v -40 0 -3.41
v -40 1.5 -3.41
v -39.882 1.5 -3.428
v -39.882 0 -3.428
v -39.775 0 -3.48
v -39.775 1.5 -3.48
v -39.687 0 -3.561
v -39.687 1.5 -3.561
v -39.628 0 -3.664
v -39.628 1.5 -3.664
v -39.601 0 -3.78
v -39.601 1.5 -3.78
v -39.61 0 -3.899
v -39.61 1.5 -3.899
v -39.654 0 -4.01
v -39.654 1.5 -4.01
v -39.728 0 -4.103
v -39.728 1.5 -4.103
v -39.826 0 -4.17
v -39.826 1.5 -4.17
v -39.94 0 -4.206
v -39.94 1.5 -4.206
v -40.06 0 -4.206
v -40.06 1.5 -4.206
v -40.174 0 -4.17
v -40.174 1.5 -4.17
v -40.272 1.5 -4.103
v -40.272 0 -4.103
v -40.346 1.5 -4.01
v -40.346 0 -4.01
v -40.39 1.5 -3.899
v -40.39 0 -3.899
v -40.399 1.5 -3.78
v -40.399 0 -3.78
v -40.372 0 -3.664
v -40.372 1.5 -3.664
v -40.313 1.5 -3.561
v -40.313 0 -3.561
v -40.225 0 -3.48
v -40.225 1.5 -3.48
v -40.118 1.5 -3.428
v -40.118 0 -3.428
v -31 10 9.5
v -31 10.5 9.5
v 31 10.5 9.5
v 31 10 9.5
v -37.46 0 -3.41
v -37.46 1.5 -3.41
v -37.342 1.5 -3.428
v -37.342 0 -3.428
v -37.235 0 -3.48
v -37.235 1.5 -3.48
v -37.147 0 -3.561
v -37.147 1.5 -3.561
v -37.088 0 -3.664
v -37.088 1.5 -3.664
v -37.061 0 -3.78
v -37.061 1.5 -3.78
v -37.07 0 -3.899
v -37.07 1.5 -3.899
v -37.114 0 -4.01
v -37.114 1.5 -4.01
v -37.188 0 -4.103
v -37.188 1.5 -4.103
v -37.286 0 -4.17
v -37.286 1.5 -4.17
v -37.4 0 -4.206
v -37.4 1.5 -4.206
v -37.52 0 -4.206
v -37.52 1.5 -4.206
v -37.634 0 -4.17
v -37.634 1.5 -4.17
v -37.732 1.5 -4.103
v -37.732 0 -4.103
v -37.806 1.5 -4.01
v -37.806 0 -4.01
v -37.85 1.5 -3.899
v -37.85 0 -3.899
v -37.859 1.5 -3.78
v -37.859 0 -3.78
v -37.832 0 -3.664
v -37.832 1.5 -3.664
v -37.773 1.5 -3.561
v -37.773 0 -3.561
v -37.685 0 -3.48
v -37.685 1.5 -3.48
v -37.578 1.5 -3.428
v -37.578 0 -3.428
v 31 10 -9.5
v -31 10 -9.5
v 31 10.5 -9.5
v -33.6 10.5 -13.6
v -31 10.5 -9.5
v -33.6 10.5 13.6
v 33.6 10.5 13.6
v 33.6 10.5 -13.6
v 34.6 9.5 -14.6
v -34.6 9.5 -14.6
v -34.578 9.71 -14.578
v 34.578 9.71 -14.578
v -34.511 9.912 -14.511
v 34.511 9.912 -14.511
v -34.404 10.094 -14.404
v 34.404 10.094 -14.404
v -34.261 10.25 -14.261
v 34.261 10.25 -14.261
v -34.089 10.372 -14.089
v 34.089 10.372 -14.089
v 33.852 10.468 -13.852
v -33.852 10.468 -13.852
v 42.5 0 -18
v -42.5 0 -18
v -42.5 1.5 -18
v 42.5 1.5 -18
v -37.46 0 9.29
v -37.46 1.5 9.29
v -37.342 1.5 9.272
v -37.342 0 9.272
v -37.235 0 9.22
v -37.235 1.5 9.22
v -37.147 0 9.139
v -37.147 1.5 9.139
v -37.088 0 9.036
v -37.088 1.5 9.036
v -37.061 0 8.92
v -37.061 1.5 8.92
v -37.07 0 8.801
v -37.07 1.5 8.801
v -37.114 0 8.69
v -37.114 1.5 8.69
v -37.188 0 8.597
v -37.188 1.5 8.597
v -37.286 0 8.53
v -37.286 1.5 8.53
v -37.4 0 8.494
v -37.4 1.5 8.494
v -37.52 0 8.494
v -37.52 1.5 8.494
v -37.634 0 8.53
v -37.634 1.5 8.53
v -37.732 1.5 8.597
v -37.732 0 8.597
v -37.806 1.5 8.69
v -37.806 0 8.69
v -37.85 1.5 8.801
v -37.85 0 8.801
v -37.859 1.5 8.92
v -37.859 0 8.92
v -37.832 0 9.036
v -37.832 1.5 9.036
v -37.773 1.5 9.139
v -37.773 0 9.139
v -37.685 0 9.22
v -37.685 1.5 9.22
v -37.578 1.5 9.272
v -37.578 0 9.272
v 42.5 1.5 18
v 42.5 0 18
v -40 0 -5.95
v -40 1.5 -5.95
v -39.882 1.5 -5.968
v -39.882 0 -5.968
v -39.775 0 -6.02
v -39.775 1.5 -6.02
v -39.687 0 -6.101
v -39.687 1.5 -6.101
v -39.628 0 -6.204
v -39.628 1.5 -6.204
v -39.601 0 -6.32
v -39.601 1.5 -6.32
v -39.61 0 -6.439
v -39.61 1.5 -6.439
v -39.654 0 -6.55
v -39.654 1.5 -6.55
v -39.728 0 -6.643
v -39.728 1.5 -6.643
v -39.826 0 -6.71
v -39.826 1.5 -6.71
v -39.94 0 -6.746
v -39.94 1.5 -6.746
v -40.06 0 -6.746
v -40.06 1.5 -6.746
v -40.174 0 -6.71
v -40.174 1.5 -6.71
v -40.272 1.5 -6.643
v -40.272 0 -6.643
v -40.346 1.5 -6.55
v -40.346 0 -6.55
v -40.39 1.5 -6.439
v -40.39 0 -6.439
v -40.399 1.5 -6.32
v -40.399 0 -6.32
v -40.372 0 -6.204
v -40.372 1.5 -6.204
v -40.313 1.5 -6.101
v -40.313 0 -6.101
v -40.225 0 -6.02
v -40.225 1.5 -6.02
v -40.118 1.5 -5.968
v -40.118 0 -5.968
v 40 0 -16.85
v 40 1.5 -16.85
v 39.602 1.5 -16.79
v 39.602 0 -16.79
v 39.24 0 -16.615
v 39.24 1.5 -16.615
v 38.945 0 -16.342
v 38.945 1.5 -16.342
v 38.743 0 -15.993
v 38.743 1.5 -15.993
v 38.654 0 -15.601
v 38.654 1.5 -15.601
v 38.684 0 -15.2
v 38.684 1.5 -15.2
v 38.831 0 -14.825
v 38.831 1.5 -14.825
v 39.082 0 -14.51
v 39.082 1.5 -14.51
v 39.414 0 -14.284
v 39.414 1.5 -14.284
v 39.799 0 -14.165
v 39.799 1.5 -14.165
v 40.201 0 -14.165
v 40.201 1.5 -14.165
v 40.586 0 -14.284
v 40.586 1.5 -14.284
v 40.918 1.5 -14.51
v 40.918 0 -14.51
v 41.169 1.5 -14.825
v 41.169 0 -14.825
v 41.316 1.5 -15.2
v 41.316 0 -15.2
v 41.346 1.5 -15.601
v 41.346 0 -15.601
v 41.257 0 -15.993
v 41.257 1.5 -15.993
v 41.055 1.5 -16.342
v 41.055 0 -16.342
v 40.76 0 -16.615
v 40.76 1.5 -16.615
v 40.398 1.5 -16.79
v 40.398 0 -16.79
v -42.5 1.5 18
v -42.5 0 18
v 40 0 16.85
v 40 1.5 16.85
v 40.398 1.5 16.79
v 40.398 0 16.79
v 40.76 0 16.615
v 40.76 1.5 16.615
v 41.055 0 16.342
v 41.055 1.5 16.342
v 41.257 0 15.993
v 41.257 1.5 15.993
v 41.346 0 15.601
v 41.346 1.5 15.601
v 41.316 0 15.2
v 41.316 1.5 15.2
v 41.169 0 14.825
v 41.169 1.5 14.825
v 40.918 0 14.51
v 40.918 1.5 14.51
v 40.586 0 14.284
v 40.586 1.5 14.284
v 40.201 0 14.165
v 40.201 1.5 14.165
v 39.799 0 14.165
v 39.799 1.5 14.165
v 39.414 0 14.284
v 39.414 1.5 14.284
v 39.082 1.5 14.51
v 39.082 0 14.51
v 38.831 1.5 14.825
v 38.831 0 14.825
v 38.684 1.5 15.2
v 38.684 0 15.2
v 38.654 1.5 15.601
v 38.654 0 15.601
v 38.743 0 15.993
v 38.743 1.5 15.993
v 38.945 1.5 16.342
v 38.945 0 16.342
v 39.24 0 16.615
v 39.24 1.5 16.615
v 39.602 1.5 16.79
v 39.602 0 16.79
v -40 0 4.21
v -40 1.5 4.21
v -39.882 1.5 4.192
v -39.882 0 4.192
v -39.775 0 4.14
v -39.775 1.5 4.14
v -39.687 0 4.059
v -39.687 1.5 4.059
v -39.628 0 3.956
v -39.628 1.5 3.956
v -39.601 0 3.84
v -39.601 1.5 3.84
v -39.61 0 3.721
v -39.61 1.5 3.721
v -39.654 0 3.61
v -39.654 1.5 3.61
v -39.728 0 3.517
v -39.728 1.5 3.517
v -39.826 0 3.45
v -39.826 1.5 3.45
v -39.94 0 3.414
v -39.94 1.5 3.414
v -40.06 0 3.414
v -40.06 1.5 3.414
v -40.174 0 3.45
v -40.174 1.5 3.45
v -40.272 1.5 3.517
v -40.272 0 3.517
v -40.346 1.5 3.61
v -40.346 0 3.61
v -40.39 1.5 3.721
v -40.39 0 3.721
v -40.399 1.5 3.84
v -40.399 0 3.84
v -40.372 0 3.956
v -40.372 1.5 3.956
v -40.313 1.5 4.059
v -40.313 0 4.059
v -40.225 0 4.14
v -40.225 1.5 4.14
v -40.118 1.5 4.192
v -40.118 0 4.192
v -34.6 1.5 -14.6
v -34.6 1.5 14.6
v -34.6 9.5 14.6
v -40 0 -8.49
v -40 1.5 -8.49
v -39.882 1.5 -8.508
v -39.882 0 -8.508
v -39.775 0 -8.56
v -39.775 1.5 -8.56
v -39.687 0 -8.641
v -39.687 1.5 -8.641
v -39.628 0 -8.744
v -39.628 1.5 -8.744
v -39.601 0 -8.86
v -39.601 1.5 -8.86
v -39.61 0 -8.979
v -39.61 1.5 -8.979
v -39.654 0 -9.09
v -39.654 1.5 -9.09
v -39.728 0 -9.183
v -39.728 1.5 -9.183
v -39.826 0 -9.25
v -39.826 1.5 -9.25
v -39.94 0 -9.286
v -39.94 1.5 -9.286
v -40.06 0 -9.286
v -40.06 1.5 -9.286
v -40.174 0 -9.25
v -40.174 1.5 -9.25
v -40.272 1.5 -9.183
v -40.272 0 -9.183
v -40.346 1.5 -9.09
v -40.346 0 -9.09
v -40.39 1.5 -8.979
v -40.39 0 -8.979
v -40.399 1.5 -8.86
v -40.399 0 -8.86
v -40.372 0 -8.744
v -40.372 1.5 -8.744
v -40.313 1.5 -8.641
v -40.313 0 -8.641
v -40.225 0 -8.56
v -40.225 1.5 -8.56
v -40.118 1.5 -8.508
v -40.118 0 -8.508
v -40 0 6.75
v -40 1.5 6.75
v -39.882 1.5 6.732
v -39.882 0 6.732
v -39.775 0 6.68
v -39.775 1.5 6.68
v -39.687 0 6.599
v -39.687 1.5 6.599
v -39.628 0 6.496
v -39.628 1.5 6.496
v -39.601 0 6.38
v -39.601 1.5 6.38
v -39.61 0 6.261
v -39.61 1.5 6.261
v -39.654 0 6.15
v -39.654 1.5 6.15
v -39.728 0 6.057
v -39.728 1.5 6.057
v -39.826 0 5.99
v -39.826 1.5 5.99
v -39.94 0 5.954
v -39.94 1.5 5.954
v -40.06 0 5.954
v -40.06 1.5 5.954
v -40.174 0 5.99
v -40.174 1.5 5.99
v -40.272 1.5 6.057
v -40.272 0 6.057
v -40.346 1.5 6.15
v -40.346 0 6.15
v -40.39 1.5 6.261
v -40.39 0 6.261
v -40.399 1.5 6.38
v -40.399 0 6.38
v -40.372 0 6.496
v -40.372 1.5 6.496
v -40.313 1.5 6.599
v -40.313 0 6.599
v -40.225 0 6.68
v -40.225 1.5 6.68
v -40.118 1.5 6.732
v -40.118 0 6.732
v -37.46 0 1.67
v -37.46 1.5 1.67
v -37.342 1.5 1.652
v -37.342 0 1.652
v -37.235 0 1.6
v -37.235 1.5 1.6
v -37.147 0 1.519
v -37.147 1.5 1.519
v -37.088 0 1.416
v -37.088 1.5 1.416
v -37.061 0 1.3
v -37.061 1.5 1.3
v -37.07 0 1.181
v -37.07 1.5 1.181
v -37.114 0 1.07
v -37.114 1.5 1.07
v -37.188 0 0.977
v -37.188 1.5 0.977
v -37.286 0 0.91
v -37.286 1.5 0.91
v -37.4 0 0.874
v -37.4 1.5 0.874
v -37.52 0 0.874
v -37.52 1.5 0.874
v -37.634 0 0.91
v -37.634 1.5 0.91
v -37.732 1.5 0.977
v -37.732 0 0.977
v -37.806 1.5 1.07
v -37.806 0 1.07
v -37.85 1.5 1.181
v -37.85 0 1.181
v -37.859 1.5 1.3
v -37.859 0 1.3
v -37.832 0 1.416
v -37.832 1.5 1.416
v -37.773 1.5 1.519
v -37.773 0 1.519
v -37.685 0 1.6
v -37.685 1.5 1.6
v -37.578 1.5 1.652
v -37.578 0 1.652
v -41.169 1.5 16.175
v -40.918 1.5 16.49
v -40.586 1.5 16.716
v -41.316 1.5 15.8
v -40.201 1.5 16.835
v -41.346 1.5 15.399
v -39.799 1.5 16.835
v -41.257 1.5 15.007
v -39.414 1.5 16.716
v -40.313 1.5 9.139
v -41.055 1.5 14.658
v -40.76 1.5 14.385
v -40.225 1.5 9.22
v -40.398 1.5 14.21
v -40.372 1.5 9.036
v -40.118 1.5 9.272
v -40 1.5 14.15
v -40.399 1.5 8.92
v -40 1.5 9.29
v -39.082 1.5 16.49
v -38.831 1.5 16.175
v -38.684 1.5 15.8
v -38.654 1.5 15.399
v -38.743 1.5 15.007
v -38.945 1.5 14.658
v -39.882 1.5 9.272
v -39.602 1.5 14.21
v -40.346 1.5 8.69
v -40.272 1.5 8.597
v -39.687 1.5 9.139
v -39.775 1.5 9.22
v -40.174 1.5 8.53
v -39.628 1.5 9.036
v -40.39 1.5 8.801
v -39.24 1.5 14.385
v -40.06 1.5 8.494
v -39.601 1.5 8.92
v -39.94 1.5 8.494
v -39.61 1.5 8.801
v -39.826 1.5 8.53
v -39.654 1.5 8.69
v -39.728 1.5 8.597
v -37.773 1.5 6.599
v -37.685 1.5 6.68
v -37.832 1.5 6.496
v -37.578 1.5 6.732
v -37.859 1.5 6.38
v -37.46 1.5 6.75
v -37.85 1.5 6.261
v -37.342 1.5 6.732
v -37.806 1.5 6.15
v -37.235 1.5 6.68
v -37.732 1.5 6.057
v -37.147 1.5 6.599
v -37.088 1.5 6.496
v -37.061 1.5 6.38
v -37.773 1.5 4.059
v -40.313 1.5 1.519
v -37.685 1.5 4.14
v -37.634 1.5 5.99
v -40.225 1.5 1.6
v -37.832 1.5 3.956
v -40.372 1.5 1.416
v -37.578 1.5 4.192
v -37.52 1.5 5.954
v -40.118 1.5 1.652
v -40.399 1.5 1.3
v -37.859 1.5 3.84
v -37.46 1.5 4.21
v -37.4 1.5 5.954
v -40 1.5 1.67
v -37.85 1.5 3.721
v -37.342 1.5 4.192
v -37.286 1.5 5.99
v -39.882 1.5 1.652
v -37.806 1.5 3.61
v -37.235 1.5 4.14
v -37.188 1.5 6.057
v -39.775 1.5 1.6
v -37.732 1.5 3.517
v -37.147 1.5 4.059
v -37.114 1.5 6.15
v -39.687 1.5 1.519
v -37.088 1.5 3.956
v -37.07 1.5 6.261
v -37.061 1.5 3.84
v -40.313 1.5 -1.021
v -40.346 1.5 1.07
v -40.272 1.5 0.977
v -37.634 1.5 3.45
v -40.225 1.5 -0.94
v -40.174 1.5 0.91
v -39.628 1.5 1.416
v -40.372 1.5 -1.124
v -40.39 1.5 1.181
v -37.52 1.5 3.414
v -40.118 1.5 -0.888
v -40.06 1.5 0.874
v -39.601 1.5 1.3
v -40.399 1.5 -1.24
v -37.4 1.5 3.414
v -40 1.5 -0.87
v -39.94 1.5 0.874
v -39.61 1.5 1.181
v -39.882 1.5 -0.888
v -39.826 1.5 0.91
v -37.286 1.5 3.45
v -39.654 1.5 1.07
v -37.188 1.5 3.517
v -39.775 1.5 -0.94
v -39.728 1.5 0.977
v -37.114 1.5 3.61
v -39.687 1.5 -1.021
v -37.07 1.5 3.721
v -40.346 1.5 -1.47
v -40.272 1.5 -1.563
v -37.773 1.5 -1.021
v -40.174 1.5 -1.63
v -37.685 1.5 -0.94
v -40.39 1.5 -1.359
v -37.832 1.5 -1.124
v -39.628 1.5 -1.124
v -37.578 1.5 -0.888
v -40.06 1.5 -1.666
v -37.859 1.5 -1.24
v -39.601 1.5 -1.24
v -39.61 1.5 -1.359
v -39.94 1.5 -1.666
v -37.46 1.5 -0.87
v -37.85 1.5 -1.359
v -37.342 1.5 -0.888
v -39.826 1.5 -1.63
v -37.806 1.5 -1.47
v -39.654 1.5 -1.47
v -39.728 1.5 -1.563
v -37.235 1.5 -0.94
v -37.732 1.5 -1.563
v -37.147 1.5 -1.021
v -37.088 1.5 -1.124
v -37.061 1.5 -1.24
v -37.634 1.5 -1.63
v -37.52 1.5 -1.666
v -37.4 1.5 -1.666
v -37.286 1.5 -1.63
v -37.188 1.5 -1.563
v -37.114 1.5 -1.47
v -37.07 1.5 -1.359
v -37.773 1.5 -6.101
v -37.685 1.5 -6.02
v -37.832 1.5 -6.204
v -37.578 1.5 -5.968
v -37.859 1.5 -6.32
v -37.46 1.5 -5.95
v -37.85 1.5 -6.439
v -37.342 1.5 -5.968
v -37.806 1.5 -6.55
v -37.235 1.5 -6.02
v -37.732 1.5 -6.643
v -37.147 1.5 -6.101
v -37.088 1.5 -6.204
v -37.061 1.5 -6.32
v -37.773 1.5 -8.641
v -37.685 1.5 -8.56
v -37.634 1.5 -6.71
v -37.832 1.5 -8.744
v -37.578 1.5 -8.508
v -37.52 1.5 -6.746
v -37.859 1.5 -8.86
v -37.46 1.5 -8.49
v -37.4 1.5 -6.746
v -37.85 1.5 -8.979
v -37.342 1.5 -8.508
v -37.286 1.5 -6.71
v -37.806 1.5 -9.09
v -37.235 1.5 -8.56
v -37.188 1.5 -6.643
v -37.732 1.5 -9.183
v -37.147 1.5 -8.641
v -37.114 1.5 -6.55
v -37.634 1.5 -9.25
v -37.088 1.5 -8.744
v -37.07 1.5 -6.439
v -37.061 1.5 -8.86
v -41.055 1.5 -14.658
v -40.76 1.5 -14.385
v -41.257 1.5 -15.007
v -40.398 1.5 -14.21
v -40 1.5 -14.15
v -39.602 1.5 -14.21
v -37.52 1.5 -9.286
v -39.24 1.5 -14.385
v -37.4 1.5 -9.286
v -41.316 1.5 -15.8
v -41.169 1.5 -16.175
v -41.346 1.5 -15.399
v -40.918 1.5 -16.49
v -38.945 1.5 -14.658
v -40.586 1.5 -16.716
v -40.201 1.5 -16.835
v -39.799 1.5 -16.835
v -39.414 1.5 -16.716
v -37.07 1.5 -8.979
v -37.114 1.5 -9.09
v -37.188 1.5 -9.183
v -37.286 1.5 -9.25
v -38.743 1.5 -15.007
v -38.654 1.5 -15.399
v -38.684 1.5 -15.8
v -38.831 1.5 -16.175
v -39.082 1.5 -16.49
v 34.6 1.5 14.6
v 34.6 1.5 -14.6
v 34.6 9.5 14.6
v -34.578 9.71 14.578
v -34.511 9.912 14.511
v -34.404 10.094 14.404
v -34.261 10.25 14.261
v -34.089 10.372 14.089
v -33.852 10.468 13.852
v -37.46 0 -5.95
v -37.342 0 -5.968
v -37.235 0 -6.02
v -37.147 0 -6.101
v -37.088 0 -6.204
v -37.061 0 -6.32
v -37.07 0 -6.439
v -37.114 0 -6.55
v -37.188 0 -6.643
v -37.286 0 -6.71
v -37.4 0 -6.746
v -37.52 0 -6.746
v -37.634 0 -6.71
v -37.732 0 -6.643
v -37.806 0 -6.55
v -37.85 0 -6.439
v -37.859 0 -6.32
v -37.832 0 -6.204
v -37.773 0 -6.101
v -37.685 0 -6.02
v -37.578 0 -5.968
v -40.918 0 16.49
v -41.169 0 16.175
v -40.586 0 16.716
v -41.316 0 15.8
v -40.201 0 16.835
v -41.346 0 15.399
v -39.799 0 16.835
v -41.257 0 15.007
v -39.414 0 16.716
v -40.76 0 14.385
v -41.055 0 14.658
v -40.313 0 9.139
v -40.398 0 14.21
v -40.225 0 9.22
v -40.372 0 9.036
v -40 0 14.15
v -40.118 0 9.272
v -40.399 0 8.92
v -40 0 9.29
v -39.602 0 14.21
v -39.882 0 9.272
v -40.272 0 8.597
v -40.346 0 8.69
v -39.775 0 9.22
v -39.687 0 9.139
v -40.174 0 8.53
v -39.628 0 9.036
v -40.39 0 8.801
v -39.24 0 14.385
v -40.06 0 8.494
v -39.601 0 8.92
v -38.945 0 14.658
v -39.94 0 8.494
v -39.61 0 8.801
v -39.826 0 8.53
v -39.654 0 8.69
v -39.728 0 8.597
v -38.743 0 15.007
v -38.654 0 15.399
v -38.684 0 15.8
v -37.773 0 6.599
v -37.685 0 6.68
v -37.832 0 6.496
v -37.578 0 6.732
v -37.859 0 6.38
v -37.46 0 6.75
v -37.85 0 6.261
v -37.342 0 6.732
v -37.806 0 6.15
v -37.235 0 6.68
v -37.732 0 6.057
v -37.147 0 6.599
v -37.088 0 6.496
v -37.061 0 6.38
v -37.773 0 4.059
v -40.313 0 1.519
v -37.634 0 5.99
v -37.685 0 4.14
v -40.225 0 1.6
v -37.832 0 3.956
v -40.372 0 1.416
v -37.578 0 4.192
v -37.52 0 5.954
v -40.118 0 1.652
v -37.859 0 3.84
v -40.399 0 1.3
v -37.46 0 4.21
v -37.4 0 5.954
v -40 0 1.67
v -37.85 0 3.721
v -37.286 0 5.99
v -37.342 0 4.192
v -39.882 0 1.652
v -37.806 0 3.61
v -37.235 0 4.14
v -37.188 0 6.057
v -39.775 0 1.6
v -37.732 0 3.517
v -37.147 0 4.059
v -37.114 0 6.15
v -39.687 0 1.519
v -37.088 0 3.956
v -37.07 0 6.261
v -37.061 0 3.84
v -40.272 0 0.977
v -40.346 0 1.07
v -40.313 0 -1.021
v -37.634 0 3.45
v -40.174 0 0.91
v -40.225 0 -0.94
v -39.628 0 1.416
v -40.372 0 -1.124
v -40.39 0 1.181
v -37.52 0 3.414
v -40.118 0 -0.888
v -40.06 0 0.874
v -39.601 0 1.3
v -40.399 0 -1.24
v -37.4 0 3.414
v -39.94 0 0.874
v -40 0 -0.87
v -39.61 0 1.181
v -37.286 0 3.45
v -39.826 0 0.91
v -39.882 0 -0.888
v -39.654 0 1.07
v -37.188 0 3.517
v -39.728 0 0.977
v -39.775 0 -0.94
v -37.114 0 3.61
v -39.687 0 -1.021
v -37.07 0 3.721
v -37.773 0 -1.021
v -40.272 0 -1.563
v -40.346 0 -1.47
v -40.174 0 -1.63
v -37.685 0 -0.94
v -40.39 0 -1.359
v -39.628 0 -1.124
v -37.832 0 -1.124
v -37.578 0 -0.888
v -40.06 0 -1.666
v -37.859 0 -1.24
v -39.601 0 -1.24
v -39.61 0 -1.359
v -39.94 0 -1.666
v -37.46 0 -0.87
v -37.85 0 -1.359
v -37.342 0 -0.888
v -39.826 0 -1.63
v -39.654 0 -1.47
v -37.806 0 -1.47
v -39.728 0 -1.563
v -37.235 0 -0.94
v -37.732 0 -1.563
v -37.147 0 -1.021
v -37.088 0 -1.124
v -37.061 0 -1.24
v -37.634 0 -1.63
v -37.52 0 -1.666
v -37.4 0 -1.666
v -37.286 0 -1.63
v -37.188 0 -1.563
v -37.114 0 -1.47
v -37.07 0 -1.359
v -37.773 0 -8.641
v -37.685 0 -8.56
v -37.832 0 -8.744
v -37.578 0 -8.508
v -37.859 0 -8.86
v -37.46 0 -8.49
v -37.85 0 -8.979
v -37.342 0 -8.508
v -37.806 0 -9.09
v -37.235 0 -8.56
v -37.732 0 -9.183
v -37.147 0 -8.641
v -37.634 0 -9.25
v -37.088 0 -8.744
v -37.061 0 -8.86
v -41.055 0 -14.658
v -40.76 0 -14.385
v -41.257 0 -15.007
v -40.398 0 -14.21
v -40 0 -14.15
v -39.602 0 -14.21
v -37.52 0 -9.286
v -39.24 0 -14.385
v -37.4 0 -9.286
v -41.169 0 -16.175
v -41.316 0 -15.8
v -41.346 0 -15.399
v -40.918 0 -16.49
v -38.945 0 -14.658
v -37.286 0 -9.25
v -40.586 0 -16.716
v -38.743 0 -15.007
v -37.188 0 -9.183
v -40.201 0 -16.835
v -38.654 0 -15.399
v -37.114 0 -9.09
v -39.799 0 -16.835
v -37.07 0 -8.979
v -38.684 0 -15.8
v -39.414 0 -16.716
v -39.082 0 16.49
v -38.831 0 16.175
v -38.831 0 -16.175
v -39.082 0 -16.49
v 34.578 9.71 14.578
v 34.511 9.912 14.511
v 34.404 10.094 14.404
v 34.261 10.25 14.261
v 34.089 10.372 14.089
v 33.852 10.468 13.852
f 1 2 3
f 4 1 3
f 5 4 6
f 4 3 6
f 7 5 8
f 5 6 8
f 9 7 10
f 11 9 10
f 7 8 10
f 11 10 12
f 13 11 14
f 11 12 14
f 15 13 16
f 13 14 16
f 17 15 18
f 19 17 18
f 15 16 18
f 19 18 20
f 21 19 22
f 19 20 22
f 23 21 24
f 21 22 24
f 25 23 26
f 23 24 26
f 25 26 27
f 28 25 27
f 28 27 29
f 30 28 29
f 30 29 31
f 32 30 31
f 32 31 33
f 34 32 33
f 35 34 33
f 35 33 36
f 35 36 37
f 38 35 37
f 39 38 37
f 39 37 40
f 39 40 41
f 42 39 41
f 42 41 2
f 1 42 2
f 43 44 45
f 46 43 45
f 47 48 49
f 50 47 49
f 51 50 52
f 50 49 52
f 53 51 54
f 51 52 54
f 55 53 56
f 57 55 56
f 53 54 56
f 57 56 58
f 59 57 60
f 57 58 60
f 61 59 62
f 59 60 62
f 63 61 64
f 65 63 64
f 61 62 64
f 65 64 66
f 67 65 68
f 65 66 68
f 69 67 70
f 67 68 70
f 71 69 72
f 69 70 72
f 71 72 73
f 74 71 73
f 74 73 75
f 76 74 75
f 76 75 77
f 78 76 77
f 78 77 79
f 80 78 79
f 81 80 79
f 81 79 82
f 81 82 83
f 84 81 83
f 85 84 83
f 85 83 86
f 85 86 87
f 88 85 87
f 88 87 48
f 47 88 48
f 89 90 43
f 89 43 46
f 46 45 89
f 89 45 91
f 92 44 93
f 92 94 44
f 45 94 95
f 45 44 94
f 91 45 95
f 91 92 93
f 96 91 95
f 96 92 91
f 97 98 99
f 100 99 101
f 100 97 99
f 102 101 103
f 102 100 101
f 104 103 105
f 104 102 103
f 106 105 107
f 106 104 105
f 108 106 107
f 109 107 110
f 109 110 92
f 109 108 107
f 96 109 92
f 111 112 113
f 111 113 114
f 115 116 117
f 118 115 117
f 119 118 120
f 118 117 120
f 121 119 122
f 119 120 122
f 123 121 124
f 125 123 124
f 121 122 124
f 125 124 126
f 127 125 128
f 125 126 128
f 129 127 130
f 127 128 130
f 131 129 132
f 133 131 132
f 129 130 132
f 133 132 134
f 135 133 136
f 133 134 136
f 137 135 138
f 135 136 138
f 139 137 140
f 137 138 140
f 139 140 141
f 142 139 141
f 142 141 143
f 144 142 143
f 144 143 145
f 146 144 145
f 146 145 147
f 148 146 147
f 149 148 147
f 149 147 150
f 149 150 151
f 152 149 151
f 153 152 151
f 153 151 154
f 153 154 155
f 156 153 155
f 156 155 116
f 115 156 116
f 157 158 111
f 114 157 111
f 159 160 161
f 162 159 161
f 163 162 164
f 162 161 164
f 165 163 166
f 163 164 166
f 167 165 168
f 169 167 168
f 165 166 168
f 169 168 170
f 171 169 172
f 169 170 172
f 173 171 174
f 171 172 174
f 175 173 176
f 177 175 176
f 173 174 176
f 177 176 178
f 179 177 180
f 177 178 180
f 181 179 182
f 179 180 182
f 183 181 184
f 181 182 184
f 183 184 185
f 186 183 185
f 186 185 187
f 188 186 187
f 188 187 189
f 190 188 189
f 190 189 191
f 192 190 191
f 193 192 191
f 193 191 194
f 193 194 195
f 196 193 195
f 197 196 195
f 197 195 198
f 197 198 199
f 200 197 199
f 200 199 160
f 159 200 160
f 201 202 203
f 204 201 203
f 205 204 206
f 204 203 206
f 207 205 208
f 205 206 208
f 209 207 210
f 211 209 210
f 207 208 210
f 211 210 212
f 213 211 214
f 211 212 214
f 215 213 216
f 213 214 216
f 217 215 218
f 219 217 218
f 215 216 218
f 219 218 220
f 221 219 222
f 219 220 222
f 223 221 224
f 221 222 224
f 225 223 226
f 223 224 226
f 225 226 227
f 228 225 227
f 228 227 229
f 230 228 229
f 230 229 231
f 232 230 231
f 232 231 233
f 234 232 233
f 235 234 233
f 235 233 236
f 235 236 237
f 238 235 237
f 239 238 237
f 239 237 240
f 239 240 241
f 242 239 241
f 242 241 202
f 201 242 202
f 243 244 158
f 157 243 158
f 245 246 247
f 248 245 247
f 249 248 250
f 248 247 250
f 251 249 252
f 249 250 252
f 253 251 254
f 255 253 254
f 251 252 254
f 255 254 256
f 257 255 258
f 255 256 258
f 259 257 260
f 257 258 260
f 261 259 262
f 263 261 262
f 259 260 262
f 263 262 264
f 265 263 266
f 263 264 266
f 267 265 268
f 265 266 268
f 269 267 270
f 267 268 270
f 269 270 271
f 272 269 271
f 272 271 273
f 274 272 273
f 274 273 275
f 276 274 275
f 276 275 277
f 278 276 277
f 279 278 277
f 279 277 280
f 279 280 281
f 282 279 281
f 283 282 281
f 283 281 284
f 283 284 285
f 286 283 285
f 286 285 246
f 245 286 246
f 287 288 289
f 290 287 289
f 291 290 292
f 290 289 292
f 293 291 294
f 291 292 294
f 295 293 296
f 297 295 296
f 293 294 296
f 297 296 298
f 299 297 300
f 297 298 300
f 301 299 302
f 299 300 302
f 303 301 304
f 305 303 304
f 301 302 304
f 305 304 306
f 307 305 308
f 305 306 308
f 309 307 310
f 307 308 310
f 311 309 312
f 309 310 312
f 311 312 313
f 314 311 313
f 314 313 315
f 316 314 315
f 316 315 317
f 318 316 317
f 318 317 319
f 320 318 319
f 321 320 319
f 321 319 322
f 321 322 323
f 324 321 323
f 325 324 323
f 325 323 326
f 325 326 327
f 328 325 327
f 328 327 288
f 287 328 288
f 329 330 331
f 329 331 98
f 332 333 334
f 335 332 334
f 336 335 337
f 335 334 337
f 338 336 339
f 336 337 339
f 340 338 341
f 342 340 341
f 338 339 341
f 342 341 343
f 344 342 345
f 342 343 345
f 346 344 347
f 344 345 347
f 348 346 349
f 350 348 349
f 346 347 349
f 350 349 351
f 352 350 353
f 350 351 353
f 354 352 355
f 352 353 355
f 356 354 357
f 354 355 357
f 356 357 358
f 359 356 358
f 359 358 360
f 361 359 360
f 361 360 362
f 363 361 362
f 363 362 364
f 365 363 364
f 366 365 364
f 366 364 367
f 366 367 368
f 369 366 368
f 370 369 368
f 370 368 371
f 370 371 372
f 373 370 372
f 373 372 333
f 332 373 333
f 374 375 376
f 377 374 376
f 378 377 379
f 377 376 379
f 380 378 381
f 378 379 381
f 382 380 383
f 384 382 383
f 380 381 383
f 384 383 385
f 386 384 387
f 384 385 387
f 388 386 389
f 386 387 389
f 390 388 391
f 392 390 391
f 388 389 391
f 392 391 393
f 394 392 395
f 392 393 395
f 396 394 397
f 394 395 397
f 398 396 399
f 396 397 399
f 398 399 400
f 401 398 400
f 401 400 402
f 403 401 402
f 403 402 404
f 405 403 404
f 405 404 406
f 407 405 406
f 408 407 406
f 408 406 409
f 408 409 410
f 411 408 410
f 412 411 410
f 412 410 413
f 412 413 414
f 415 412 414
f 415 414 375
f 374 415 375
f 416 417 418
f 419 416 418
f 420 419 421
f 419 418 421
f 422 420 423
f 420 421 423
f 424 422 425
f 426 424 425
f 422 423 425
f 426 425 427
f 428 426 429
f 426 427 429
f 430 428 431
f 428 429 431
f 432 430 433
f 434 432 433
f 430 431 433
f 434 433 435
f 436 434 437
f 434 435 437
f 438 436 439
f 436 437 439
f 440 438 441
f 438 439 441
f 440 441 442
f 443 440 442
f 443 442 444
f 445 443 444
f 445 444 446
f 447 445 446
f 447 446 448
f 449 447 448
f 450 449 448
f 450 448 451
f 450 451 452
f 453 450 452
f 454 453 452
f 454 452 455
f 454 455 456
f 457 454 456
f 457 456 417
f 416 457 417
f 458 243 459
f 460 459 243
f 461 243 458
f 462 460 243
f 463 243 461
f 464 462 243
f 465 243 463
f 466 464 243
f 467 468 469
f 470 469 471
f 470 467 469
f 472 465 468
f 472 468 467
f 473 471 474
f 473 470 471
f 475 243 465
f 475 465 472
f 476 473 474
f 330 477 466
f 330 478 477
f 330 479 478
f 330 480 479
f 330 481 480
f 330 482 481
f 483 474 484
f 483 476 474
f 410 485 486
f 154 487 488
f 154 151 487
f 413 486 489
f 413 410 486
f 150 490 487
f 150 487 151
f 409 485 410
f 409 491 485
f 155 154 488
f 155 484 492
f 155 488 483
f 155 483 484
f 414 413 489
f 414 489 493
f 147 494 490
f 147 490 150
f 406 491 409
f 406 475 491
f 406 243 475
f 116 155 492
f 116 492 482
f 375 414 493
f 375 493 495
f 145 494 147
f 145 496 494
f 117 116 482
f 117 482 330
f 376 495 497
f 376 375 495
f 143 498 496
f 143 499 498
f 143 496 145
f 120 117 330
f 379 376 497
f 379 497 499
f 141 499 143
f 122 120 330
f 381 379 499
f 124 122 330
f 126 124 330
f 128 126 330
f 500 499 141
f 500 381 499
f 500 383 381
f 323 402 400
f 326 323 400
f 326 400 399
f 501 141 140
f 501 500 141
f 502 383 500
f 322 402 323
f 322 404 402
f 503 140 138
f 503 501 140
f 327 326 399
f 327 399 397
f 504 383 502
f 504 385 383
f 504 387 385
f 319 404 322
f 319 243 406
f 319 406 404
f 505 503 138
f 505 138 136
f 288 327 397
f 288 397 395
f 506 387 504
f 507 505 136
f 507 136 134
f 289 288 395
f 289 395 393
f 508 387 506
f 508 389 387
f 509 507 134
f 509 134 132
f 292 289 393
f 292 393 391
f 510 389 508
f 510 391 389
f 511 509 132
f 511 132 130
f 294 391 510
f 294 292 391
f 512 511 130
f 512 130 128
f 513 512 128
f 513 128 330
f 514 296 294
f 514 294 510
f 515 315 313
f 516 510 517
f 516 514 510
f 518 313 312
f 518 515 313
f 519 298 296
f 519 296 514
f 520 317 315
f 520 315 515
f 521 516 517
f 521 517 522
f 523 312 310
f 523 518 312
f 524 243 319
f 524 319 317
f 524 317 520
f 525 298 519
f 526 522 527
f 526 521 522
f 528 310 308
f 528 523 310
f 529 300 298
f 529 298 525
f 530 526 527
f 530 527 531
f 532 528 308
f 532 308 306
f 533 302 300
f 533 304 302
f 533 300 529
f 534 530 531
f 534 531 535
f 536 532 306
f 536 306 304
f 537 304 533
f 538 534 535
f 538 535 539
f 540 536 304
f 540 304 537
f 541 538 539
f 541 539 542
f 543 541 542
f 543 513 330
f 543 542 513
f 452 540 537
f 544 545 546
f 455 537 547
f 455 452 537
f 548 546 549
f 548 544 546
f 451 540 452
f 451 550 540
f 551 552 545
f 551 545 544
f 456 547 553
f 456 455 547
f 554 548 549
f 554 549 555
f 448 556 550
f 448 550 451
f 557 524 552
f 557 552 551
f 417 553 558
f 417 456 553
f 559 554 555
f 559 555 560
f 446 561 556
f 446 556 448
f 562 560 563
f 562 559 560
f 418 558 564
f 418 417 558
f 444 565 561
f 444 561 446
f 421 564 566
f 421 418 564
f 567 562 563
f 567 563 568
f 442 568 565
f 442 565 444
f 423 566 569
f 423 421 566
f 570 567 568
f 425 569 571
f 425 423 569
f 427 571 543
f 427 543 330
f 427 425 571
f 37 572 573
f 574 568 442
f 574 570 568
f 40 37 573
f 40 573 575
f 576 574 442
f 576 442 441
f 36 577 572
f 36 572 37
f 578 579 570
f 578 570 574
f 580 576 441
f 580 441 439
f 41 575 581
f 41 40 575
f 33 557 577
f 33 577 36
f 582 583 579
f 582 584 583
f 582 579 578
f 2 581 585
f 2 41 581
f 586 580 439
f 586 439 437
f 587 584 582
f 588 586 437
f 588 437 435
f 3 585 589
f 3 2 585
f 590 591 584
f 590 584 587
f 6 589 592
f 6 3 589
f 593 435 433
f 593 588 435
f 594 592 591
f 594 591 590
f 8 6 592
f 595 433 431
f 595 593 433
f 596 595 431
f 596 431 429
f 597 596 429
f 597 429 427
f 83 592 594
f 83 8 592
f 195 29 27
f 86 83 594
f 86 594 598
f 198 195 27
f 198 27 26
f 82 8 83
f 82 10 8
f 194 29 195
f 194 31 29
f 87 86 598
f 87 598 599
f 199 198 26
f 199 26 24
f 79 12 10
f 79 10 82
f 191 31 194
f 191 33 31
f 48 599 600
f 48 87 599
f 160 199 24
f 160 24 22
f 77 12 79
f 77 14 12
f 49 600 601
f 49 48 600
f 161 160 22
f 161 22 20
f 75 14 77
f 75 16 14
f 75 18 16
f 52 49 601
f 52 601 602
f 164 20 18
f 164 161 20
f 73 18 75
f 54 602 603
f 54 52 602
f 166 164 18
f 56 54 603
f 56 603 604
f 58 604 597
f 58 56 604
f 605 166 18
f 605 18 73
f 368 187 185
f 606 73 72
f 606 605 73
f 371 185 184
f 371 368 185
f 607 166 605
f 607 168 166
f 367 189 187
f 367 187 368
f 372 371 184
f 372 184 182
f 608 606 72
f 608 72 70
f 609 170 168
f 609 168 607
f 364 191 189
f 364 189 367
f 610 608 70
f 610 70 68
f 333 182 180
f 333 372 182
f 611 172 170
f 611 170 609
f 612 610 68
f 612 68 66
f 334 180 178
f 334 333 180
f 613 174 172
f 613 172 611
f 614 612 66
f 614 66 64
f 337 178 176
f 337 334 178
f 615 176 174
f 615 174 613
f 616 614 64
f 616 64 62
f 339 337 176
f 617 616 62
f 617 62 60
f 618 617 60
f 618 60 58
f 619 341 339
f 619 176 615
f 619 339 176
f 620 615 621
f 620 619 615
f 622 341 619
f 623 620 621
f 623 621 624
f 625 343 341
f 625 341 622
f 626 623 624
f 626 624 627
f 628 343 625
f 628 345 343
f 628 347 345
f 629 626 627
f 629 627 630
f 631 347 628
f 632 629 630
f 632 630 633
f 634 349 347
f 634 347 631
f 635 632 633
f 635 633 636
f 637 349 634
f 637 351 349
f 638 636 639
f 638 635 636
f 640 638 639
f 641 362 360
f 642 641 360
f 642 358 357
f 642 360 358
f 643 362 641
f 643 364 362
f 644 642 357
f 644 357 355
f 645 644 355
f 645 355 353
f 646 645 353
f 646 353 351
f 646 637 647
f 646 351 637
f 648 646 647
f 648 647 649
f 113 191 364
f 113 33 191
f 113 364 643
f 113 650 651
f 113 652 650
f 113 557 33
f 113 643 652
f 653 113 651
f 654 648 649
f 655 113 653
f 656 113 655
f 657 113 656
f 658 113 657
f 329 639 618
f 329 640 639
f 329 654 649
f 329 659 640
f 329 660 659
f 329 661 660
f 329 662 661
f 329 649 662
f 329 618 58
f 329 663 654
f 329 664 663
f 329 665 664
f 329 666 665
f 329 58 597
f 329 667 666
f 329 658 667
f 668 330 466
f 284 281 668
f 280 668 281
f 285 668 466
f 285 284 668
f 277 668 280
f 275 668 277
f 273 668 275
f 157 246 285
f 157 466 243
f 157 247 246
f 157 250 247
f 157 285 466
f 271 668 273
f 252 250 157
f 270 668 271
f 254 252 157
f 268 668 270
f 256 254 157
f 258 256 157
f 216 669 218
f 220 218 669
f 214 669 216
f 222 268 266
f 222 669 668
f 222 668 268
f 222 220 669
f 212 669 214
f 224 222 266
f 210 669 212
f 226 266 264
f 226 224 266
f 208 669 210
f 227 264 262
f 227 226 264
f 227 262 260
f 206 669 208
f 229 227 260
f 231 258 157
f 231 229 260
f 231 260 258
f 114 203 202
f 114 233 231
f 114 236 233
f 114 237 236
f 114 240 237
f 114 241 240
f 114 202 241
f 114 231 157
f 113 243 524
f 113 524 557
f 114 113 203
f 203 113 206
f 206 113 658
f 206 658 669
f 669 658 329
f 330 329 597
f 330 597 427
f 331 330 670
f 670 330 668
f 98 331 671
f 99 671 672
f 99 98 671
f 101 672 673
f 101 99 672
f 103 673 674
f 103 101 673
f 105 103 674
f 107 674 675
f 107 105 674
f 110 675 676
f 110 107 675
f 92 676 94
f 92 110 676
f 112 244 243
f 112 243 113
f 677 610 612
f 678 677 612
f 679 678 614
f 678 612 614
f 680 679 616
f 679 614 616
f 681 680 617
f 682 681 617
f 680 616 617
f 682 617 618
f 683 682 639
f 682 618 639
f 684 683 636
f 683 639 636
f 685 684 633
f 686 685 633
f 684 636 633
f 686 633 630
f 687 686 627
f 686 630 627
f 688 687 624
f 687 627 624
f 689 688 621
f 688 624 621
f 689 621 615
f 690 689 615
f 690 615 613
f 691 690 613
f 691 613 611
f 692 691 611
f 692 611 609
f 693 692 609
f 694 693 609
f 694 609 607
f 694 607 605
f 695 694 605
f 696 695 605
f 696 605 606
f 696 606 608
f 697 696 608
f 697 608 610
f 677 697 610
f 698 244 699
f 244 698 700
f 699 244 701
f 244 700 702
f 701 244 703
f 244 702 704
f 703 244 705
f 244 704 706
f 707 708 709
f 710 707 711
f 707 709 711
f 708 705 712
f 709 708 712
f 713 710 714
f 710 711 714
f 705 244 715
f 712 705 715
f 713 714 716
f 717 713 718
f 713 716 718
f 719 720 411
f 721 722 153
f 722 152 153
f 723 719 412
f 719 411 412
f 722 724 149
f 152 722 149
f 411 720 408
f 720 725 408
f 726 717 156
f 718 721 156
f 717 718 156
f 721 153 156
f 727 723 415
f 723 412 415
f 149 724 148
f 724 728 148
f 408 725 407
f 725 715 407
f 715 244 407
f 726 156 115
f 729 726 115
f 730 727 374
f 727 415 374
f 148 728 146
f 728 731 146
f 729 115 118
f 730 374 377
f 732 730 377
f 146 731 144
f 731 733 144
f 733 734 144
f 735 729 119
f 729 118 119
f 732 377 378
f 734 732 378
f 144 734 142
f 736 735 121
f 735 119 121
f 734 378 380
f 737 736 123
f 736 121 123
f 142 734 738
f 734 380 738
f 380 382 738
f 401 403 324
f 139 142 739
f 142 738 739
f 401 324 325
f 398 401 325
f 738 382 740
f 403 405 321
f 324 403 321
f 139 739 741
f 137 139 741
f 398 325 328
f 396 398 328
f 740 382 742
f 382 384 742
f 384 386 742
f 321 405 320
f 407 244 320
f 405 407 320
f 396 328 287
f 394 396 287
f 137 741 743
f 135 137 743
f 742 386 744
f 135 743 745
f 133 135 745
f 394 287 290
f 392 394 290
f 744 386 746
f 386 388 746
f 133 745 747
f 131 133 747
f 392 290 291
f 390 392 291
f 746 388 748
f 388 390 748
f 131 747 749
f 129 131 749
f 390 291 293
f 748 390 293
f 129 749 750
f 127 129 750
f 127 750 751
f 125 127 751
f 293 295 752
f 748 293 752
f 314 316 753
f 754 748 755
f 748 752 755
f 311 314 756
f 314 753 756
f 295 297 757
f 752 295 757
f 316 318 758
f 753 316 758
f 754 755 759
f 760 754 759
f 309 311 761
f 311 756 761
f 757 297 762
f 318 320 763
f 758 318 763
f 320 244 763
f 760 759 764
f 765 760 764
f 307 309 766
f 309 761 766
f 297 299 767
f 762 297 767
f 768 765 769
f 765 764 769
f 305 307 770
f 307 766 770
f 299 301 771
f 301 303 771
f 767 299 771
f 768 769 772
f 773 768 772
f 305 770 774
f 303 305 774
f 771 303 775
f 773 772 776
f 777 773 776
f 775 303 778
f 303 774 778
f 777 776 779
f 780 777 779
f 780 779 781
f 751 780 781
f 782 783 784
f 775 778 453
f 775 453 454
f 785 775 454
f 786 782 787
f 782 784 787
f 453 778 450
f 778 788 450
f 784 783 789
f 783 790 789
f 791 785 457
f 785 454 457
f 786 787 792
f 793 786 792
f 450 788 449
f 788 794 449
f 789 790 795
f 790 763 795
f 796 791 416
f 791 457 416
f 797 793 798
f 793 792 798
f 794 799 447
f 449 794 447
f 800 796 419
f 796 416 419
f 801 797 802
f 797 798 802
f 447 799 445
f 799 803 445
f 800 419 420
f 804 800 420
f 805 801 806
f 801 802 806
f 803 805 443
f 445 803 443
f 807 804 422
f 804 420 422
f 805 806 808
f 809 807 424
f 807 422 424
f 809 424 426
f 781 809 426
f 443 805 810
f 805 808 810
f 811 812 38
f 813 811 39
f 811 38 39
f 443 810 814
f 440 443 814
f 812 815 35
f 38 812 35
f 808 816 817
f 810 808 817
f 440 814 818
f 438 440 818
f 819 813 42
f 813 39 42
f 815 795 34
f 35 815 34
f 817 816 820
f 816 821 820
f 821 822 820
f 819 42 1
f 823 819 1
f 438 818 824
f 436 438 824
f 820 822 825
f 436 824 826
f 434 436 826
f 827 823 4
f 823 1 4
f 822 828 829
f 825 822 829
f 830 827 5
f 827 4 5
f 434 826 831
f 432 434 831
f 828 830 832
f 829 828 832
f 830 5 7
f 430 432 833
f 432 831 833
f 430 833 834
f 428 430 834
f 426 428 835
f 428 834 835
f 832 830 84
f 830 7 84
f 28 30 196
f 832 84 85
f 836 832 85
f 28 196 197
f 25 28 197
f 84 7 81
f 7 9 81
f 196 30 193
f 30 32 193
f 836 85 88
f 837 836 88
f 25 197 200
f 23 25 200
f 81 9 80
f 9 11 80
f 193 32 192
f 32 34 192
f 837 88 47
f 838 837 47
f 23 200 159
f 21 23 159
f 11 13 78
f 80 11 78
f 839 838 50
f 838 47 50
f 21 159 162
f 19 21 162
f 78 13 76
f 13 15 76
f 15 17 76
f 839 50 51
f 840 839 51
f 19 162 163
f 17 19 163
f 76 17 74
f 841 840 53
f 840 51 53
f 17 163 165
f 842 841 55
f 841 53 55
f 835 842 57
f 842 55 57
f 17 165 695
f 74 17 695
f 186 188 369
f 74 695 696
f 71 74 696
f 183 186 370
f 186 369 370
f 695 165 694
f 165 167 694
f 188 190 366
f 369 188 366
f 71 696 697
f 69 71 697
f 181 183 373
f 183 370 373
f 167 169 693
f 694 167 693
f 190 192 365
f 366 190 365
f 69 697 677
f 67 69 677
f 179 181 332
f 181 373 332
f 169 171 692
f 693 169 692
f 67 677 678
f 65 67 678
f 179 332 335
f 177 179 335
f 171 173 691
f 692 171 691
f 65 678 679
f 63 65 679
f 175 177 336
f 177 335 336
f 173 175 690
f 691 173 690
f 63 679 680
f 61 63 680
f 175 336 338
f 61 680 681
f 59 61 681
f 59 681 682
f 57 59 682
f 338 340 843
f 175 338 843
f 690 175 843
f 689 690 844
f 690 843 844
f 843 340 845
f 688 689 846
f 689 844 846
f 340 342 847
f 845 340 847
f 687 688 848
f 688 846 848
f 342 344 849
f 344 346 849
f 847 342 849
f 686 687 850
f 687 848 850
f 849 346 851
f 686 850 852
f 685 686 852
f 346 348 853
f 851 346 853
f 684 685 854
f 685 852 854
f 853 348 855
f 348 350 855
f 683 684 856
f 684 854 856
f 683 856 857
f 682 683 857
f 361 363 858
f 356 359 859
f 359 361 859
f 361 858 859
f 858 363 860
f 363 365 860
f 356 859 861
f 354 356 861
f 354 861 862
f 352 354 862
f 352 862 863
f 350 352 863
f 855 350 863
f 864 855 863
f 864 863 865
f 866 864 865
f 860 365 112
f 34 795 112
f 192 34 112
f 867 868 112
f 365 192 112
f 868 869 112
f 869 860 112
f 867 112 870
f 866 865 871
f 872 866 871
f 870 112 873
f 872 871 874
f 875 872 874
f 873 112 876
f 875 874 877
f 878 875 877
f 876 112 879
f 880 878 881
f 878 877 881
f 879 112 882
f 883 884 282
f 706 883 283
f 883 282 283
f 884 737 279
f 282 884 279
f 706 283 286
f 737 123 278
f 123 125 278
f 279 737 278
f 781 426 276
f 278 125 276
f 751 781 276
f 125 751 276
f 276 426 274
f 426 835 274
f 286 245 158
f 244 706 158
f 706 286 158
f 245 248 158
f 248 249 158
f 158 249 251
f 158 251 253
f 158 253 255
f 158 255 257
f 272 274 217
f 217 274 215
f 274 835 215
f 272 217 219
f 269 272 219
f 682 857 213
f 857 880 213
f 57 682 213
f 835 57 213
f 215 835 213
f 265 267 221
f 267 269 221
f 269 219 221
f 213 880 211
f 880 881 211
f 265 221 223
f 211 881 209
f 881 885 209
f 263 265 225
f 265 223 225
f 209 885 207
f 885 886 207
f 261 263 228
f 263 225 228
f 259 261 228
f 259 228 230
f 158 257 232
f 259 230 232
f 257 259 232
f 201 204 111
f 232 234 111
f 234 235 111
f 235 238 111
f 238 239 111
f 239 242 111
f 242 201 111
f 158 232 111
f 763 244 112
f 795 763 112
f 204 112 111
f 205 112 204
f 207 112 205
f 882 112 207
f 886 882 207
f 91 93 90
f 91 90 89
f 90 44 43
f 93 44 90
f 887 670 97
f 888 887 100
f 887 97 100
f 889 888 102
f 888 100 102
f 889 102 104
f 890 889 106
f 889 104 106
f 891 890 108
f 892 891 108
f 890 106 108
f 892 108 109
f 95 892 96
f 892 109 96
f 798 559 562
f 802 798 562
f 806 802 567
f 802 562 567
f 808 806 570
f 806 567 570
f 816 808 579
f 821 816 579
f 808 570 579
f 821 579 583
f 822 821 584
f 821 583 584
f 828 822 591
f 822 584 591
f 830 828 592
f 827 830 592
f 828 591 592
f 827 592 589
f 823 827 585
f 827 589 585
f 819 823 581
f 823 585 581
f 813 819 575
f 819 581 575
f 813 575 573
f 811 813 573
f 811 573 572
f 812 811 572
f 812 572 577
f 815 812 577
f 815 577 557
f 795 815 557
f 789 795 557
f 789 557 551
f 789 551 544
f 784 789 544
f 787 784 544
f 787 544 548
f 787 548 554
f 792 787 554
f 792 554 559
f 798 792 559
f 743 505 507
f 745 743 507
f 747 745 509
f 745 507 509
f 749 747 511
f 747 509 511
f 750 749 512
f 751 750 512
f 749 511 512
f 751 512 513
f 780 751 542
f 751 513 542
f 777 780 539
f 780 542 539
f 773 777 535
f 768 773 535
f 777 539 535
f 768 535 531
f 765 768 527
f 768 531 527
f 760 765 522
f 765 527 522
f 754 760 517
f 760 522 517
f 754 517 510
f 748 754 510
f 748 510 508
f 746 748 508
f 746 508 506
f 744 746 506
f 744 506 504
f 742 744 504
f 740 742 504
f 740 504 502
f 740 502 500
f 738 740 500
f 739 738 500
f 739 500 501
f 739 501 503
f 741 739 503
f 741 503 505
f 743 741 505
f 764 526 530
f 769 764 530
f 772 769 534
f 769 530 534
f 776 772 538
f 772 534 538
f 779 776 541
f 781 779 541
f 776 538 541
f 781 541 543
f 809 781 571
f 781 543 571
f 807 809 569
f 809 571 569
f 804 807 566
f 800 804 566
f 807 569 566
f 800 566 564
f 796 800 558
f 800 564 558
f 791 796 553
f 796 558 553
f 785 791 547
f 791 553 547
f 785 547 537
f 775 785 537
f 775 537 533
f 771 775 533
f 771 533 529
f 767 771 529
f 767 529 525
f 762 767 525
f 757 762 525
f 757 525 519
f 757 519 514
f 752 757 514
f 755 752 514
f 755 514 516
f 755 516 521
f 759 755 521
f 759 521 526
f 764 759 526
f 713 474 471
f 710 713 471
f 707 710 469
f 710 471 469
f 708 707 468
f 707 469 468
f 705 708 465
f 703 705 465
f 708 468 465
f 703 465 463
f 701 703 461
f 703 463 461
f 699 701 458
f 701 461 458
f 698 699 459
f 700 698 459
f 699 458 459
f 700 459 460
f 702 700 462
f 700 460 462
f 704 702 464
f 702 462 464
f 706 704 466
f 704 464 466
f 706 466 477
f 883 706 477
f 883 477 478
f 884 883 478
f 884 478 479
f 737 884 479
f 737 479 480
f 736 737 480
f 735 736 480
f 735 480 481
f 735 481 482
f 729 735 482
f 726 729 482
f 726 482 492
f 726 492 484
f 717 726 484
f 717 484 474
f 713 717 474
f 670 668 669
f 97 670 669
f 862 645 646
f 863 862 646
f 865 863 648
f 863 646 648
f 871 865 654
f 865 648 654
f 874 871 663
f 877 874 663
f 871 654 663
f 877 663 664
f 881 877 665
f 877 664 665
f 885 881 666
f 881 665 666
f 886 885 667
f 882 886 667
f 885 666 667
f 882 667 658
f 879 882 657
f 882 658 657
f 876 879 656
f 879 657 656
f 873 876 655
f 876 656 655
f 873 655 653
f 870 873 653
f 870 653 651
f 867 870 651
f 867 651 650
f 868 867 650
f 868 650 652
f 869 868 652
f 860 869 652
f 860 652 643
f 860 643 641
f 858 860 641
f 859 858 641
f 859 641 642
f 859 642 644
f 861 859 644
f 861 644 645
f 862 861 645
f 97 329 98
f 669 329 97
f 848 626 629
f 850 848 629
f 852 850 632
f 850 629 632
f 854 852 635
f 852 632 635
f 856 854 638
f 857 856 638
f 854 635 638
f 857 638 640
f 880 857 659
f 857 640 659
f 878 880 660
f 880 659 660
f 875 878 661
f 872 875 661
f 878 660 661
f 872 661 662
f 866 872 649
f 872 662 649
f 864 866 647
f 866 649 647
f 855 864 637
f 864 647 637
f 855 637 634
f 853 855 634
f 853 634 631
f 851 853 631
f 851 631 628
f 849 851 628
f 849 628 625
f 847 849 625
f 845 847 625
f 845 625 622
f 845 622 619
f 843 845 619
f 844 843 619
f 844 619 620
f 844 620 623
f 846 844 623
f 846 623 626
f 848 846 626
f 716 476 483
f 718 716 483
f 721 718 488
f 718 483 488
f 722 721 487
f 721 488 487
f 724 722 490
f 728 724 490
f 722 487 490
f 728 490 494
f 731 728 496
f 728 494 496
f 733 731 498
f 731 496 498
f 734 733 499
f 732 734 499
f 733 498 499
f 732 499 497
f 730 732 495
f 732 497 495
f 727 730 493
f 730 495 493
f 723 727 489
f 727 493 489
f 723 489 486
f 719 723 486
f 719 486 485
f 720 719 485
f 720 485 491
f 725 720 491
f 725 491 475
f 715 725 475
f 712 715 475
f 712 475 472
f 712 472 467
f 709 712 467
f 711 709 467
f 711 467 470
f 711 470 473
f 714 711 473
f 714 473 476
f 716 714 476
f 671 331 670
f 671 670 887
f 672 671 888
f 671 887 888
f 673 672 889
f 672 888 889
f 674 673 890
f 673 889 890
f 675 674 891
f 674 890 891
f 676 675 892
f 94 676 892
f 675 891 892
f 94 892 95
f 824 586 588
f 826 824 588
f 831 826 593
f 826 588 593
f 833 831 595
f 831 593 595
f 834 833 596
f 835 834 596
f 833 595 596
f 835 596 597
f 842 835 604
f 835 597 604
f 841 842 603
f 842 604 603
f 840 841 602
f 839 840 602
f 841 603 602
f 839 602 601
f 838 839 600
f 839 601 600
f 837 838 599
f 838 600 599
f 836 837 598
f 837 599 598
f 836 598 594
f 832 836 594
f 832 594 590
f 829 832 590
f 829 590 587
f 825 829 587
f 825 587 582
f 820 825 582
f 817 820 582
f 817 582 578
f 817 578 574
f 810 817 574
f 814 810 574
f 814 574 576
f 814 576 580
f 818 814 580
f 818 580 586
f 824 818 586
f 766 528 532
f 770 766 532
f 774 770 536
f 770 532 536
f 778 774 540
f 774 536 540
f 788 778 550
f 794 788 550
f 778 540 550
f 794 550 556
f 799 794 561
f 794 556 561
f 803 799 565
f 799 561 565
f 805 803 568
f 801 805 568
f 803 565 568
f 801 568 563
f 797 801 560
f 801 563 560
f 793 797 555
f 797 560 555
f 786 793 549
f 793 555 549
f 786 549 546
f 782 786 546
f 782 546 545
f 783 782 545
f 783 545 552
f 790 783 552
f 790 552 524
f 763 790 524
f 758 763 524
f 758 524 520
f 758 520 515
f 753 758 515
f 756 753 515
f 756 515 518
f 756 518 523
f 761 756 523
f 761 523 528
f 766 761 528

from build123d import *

# Parameters (mm, degrees)
SKETCH_1_W                  = 85
SKETCH_1_H                  = 36
EXTRUDE_1_DEPTH             = 1.5
SKETCH_2_W                  = 69.2
SKETCH_2_H                  = 29.2
EXTRUDE_2_DEPTH             = 9
CUT_EXTRUDE_1_REACH         = 49.024
SKETCH_3_R                  = 1.35
SKETCH_4_W                  = 62
SKETCH_4_H                  = 19
CUT_EXTRUDE_2_DEPTH         = 0.5
FILLET_1_R                  = 1
CUT_EXTRUDE_3_REACH         = 49.024
SKETCH_5_R                  = 0.4
PATTERN_LINEAR_1_COUNT      = 8
PATTERN_LINEAR_1_PITCH      = 2.54
PATTERN_LINEAR_1_COUNT_DIR2 = 2
PATTERN_LINEAR_1_PITCH_DIR2 = 2.54


with BuildPart() as part:
    # Эскиз1 → Бобышка-Вытянуть1 (new body)
    with BuildSketch(Plane(origin=(0, 0, 0), x_dir=(1, 0, 0), z_dir=(0, 1, 0))):
        Rectangle(SKETCH_1_W, SKETCH_1_H)
    extrude(amount=EXTRUDE_1_DEPTH)

    # Эскиз2 → Бобышка-Вытянуть2 (add)
    with BuildSketch(Plane(origin=(0, 1.5, 0), x_dir=(1, 0, 0), z_dir=(0, 1, 0))):
        Rectangle(SKETCH_2_W, SKETCH_2_H)
    extrude(amount=EXTRUDE_2_DEPTH)

    # Эскиз3 → Вырез-Вытянуть1 (cut, up to next)
    with BuildSketch(Plane(origin=(0, 1.5, 0), x_dir=(1, 0, 0), z_dir=(0, 1, 0)), mode=Mode.PRIVATE) as cut_extrude_1_sk1:
        with Locations(Location((-40, 15.5, 0), (0, 0, 270))):
            Circle(SKETCH_3_R)
    cut_extrude_1_tool1 = extrude(cut_extrude_1_sk1.sketch, amount=-CUT_EXTRUDE_1_REACH, mode=Mode.PRIVATE) & part.part
    # Эскиз3 → Вырез-Вытянуть1 (cut, up to next)
    with BuildSketch(Plane(origin=(0, 1.5, 0), x_dir=(1, 0, 0), z_dir=(0, 1, 0)), mode=Mode.PRIVATE) as cut_extrude_1_sk2:
        with Locations(Location((-40, -15.5, 0), (0, 0, 90))):
            Circle(SKETCH_3_R)
    cut_extrude_1_tool2 = extrude(cut_extrude_1_sk2.sketch, amount=-CUT_EXTRUDE_1_REACH, mode=Mode.PRIVATE) & part.part
    # Эскиз3 → Вырез-Вытянуть1 (cut, up to next)
    with BuildSketch(Plane(origin=(0, 1.5, 0), x_dir=(1, 0, 0), z_dir=(0, 1, 0)), mode=Mode.PRIVATE) as cut_extrude_1_sk3:
        with Locations(Location((40, -15.5, 0), (0, 0, 270))):
            Circle(SKETCH_3_R)
    cut_extrude_1_tool3 = extrude(cut_extrude_1_sk3.sketch, amount=-CUT_EXTRUDE_1_REACH, mode=Mode.PRIVATE) & part.part
    # Эскиз3 → Вырез-Вытянуть1 (cut, up to next)
    with BuildSketch(Plane(origin=(0, 1.5, 0), x_dir=(1, 0, 0), z_dir=(0, 1, 0)), mode=Mode.PRIVATE) as cut_extrude_1_sk4:
        with Locations(Location((40, 15.5, 0), (0, 0, 90))):
            Circle(SKETCH_3_R)
    cut_extrude_1_tool4 = extrude(cut_extrude_1_sk4.sketch, amount=-CUT_EXTRUDE_1_REACH, mode=Mode.PRIVATE) & part.part
    add(cut_extrude_1_tool1.solids().sort_by_distance((-40, 1.5, -15.5))[0], mode=Mode.SUBTRACT)
    add(cut_extrude_1_tool2.solids().sort_by_distance((-40, 1.5, 15.5))[0], mode=Mode.SUBTRACT)
    add(cut_extrude_1_tool3.solids().sort_by_distance((40, 1.5, 15.5))[0], mode=Mode.SUBTRACT)
    add(cut_extrude_1_tool4.solids().sort_by_distance((40, 1.5, -15.5))[0], mode=Mode.SUBTRACT)

    # Эскиз4 → Вырез-Вытянуть2 (cut)
    with BuildSketch(Plane(origin=(0, 10.5, 0), x_dir=(1, 0, 0), z_dir=(0, 1, 0))):
        Rectangle(SKETCH_4_W, SKETCH_4_H)
    extrude(amount=-CUT_EXTRUDE_2_DEPTH, mode=Mode.SUBTRACT)

    # Скругление1
    fillet_1_edges = [part.edges().sort_by_distance(p)[0] for p in [
        (34.6, 10.5, 0),
        (0, 10.5, -14.6),
        (-34.6, 10.5, 0),
        (0, 10.5, 14.6),
    ]]
    fillet(fillet_1_edges, radius=FILLET_1_R)

    # Эскиз5 → Вырез-Вытянуть3 (cut, up to next)
    with BuildSketch(Plane(origin=(0, 1.5, 0), x_dir=(1, 0, 0), z_dir=(0, 1, 0)), mode=Mode.PRIVATE) as cut_extrude_3_sk1:
        with Locations(Location((-40, 8.89, 0), (0, 0, 270))):
            Circle(SKETCH_5_R)
    cut_extrude_3_tool1 = extrude(cut_extrude_3_sk1.sketch, amount=-CUT_EXTRUDE_3_REACH, mode=Mode.PRIVATE) & part.part
    cut_extrude_3 = cut_extrude_3_tool1.solids().sort_by_distance((-40, 1.5, -8.89))[0]
    add(cut_extrude_3, mode=Mode.SUBTRACT)

    # Линейный массив1: Cut-Extrude 3 8 × 2
    with Locations(*[(j * PATTERN_LINEAR_1_PITCH_DIR2, 0, i * PATTERN_LINEAR_1_PITCH) for i in range(PATTERN_LINEAR_1_COUNT) for j in range(PATTERN_LINEAR_1_COUNT_DIR2) if (i, j) != (0, 0)]):
        add(cut_extrude_3, mode=Mode.SUBTRACT)


solid = part.part
